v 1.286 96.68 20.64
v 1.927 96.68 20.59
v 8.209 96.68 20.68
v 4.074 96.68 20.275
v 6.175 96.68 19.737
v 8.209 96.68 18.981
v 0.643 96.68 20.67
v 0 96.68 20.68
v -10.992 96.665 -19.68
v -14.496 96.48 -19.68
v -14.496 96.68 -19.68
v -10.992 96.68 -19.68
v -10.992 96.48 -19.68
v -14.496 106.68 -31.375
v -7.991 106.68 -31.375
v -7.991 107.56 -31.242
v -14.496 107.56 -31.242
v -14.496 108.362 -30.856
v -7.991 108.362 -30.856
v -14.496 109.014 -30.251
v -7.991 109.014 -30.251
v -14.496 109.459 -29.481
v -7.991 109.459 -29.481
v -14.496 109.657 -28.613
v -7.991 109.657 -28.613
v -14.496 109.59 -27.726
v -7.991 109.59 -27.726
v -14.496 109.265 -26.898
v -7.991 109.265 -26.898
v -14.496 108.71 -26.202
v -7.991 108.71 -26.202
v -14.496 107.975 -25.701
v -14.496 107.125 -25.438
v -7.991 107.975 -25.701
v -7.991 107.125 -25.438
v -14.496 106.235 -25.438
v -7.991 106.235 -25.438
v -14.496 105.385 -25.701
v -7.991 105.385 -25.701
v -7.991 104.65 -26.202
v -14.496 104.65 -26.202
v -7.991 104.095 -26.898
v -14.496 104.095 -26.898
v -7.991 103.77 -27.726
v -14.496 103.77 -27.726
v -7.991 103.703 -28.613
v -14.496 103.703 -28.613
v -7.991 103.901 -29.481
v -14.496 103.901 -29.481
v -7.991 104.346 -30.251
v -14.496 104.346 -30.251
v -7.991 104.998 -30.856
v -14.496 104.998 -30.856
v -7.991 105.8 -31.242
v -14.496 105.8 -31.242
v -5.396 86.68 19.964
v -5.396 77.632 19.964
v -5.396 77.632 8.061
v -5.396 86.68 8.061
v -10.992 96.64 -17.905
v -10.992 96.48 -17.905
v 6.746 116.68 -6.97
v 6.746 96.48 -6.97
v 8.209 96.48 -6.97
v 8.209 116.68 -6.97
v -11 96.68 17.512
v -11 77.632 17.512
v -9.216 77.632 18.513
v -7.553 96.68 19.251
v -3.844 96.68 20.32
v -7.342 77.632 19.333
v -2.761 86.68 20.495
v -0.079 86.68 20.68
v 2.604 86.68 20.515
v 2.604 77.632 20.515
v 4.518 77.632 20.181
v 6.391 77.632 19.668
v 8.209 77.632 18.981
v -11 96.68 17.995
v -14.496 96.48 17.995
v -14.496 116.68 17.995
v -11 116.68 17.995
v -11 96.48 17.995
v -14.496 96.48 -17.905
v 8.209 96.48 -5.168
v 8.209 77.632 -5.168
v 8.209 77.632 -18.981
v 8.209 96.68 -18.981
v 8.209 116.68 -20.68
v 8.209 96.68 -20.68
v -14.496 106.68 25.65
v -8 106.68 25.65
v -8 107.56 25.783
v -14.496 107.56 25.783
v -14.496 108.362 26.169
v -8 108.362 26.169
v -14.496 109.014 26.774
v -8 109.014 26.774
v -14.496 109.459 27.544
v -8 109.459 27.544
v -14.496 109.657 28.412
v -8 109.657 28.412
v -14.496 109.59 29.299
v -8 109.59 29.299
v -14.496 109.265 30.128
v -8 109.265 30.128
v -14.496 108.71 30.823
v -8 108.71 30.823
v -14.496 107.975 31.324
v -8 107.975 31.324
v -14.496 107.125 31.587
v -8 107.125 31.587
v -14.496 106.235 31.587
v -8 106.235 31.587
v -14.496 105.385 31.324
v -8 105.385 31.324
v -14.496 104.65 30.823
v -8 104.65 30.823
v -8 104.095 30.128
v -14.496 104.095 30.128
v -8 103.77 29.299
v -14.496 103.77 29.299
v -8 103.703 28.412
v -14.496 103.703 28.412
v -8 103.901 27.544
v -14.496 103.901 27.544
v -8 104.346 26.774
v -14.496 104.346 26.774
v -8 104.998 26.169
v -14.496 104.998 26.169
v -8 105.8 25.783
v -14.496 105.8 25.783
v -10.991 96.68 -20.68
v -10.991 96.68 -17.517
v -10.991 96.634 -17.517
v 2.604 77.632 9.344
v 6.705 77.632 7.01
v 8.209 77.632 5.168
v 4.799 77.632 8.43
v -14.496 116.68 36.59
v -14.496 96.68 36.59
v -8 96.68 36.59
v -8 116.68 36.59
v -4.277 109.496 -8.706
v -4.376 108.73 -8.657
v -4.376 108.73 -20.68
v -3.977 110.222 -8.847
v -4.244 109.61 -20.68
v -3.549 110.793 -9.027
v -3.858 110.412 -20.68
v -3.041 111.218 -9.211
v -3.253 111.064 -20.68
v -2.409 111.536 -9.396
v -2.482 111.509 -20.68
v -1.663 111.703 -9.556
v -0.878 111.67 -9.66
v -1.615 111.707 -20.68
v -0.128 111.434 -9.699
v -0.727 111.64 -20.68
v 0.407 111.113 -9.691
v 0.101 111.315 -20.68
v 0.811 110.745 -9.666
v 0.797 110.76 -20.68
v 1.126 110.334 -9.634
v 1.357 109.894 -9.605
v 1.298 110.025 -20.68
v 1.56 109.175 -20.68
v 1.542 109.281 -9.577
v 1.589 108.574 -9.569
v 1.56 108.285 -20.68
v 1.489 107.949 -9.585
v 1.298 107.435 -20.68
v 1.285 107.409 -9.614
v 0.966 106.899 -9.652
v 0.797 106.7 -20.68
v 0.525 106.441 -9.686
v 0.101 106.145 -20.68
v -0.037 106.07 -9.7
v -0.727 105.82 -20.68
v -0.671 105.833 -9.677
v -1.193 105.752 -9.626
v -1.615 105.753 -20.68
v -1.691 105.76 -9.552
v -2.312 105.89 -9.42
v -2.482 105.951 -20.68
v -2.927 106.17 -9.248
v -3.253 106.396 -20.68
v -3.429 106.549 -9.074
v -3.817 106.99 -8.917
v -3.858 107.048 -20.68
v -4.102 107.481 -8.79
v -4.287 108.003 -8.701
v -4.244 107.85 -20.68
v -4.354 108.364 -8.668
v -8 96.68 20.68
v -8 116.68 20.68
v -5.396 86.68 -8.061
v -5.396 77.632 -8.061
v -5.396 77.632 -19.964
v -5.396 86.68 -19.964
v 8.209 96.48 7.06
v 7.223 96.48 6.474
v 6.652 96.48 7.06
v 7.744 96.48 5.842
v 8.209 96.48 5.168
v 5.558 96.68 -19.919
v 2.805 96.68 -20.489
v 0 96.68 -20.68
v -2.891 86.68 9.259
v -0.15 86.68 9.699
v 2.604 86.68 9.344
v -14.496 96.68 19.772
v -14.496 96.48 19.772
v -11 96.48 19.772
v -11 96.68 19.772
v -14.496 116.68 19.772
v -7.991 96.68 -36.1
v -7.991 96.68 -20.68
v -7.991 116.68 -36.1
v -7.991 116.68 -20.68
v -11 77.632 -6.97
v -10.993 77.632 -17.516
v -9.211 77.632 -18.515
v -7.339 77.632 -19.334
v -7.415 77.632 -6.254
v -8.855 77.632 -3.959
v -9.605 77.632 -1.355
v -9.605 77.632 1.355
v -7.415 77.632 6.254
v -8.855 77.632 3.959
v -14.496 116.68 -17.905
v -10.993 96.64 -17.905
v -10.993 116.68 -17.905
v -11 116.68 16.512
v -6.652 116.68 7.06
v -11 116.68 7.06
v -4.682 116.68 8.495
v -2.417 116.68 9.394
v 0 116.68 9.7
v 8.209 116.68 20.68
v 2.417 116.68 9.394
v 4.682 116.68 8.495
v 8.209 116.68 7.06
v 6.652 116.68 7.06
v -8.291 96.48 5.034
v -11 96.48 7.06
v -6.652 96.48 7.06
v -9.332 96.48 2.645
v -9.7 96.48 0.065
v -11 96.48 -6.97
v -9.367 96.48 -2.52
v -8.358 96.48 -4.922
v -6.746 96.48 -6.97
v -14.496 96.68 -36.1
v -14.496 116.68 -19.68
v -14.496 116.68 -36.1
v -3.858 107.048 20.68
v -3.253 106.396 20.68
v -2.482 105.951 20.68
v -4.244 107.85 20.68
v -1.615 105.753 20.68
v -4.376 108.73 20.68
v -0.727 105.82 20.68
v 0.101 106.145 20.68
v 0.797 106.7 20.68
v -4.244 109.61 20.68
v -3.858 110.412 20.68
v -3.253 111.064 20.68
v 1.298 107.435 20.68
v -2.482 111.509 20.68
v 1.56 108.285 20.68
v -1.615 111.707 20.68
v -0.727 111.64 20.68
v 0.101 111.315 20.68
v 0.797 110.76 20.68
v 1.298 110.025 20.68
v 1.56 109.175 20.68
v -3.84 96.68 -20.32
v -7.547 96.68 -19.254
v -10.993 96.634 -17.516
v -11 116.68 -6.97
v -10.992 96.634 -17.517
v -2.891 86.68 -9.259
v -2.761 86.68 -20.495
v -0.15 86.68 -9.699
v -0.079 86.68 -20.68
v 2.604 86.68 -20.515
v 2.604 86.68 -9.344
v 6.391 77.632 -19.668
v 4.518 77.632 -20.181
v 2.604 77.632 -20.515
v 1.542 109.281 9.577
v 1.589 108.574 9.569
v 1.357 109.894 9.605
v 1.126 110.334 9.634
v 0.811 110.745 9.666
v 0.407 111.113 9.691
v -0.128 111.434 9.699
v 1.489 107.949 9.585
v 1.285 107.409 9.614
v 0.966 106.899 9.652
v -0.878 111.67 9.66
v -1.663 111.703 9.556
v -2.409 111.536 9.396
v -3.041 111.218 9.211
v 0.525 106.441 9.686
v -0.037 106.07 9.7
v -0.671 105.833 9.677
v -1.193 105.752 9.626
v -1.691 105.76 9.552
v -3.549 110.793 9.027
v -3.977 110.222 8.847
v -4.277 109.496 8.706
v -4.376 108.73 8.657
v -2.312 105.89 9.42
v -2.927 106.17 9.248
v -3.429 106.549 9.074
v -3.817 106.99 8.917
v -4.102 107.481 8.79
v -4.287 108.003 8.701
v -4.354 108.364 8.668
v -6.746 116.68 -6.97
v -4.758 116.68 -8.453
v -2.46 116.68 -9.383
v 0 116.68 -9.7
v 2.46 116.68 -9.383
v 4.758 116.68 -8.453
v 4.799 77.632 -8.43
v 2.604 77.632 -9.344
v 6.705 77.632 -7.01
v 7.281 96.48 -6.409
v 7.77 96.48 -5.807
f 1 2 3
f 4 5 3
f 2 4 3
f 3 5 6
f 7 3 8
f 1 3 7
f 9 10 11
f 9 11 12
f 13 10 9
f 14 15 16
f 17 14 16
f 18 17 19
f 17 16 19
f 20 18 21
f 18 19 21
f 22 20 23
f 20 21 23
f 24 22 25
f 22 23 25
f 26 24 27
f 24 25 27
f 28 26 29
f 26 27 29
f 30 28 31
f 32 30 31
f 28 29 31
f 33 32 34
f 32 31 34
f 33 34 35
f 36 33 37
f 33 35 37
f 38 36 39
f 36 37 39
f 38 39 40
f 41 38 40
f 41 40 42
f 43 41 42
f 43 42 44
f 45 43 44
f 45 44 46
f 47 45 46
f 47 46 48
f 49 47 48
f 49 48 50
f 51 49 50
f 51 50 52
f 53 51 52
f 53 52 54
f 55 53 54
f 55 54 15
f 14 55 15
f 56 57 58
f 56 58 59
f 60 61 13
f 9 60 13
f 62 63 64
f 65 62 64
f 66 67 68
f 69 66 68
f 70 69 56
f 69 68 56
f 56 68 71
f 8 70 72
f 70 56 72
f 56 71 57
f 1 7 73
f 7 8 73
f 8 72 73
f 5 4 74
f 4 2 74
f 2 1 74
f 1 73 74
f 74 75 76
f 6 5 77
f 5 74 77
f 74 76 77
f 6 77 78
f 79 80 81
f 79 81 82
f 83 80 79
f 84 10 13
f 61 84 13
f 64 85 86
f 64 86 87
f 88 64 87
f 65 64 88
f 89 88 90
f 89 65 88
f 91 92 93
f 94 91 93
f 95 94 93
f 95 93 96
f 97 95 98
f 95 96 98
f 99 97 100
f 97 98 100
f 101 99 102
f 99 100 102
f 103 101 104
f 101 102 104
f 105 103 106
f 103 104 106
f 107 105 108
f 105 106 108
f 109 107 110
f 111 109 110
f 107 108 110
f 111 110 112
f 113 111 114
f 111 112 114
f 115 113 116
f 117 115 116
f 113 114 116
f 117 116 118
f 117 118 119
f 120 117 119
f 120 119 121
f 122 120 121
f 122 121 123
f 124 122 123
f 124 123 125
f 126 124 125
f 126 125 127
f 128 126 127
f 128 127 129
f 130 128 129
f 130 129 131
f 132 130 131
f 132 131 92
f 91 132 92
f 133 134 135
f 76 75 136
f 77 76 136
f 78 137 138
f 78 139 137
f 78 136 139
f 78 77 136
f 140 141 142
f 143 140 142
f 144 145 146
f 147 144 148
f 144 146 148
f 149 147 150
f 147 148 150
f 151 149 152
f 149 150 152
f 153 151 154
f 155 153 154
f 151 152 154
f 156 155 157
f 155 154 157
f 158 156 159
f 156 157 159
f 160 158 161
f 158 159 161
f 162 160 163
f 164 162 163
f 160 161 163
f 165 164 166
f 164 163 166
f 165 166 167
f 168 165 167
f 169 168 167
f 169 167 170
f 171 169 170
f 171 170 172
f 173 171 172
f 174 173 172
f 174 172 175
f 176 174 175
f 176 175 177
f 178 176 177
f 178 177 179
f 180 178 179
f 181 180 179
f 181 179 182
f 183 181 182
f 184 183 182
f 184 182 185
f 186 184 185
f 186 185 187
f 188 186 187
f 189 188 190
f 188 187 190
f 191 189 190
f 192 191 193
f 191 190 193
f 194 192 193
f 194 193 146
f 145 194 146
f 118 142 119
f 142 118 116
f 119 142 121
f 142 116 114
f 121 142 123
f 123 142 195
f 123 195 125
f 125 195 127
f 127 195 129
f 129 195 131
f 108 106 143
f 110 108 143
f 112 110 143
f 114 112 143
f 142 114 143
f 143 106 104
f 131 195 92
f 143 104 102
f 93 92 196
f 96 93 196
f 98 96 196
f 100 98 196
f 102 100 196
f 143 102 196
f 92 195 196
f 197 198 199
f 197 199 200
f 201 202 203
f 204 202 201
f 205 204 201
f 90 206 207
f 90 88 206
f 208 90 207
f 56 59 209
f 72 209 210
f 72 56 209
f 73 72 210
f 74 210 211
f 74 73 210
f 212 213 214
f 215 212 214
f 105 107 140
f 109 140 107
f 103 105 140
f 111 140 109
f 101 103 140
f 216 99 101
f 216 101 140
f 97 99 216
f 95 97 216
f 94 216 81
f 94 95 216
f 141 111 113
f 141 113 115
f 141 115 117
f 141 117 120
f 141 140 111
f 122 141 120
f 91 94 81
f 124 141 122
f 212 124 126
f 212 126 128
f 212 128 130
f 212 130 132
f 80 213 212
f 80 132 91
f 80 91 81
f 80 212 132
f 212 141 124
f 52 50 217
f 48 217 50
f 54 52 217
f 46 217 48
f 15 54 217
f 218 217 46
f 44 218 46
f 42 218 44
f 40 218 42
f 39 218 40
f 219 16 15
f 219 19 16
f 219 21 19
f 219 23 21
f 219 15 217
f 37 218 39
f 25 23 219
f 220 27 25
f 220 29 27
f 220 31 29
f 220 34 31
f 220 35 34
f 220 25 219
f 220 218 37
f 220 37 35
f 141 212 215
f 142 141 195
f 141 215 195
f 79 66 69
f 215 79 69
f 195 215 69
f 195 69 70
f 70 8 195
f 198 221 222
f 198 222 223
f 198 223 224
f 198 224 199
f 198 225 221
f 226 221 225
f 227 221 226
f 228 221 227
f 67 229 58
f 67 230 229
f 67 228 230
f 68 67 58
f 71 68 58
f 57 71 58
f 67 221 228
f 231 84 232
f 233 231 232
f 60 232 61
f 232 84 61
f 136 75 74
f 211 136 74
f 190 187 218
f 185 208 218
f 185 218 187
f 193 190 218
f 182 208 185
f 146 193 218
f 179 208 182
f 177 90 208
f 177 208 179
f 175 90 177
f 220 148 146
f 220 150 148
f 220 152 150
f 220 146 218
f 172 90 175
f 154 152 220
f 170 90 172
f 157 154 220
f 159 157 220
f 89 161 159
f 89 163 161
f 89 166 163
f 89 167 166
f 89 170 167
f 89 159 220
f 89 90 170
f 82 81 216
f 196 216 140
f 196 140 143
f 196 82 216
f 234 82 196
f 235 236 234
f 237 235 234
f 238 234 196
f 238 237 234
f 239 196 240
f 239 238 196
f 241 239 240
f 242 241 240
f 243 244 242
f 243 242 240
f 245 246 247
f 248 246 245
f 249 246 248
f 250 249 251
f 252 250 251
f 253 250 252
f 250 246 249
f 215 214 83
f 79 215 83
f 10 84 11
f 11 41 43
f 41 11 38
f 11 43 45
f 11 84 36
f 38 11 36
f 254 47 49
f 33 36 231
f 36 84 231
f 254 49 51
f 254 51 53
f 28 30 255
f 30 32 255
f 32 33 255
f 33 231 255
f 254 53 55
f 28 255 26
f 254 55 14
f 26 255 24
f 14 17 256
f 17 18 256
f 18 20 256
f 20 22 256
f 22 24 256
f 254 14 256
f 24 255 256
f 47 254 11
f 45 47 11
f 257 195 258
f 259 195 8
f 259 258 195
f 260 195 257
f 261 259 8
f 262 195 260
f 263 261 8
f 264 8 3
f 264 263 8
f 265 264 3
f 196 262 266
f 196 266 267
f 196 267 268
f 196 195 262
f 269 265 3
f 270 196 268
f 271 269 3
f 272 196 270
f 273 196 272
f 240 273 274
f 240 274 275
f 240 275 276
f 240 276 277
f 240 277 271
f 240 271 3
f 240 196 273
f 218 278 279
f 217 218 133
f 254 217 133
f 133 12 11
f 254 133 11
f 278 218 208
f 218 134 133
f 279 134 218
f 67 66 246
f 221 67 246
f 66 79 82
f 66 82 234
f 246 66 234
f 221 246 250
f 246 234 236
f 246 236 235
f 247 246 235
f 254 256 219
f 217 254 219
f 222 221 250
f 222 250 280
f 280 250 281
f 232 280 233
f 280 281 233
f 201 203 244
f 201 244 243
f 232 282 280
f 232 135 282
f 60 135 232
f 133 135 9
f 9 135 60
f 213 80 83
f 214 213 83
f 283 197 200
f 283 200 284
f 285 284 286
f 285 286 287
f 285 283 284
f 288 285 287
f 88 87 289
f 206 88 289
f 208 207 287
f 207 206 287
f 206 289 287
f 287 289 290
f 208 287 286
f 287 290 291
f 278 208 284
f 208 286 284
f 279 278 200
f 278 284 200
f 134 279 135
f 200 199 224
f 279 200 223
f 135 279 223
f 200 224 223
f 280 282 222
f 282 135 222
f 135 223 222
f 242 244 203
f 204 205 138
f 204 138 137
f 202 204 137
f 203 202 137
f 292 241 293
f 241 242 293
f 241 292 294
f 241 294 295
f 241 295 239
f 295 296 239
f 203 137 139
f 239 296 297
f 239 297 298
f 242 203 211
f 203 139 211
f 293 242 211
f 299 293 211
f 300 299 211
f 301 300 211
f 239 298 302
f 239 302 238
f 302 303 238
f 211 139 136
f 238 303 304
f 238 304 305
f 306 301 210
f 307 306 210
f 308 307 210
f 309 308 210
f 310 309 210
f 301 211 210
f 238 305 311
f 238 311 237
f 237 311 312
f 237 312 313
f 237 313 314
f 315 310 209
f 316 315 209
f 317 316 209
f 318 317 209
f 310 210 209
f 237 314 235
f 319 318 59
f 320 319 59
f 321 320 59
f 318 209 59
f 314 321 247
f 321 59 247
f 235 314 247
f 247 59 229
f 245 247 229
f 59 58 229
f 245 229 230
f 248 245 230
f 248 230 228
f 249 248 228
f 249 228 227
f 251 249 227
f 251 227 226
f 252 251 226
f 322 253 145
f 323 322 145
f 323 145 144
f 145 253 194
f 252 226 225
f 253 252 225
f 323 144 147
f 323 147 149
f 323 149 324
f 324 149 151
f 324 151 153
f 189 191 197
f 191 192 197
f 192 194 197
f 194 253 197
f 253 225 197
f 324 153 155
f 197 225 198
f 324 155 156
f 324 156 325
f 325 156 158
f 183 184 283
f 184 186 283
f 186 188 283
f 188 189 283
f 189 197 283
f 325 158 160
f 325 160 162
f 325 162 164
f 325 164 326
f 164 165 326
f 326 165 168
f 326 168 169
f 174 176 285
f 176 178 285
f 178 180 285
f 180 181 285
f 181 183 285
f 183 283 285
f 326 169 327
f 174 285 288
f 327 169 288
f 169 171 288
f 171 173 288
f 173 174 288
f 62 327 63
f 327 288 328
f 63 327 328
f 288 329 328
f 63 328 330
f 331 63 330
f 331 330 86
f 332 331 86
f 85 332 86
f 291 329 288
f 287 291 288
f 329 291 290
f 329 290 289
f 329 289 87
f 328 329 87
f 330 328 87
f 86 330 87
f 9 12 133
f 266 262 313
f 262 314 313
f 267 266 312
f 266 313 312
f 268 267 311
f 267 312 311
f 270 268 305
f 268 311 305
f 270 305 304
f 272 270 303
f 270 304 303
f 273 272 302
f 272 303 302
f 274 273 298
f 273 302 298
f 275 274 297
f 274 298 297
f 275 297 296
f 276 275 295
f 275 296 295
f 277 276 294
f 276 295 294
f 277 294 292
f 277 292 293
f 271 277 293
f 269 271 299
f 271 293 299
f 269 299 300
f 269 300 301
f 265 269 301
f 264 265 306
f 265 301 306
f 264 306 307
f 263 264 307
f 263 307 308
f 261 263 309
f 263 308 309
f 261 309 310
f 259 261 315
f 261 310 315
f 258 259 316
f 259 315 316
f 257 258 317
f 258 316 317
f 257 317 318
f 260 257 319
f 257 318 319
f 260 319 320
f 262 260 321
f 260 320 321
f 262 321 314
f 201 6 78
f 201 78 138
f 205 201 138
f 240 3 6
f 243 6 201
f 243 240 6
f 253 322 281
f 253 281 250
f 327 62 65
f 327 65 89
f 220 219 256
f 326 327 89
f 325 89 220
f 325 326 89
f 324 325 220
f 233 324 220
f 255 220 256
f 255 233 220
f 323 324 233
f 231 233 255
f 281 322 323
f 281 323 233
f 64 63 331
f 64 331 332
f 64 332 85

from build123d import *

# Parameters (mm, degrees)
SKETCH_1_R           = 20.68
SKETCH_1_R_2         = 9.68
EXTRUDE_1_DEPTH      = 116.68
SKETCH_11_W          = 27
SKETCH_11_H          = 150
CUT_EXTRUDE_3_DEPTH  = 40
SKETCH_13_W          = 10
SKETCH_13_H          = 128.345013401
CUT_EXTRUDE_7_DEPTH  = 126.614916312
SKETCH_15_W          = 8
SKETCH_15_H          = 68.68
CUT_EXTRUDE_9_DEPTH  = 48
SKETCH_16_W          = 15.549431524
SKETCH_16_H          = 20
SKETCH_16_W_2        = 15.459431524
EXTRUDE_4_DEPTH      = 19.2
SKETCH_17_W          = 19.20851187
SKETCH_17_H          = 14.03
CUT_EXTRUDE_10_DEPTH = 20.2
SKETCH_18_R          = 9.59
CUT_EXTRUDE_11_DEPTH = 121.289430957
SKETCH_21_R          = 2.985
CUT_EXTRUDE_12_DEPTH = 55.2
EXTRUDE_START        = 55.2
SKETCH_24_R          = 20.59
SKETCH_24_R_2        = 9.59
EXTRUDE_2_DEPTH      = 55.2
CUT_EXTRUDE_13_DEPTH = 55.2
SKETCH_26_W          = 10.00851187
SKETCH_26_H          = 41.68
CUT_EXTRUDE_15_DEPTH = 55.2
SKETCH_27_W          = 10
SKETCH_27_H          = 40
CUT_EXTRUDE_16_DEPTH = 55.2
SKETCH_28_W          = 44.880694938
SKETCH_28_H          = 9.608044066
CUT_EXTRUDE_17_DEPTH = 12.2
SKETCH_35_W          = 13.53
SKETCH_35_H          = 20
EXTRUDE_10_DEPTH     = 15
EXTRUDE_11_DEPTH     = 15
SKETCH_37_W          = 9
SKETCH_37_H          = 20
EXTRUDE_12_DEPTH     = 20
SKETCH_38_W          = 9
SKETCH_38_H          = 20
EXTRUDE_13_DEPTH     = 20
SKETCH_42_R          = 2.985
CUT_EXTRUDE_21_DEPTH = 20
CUT_EXTRUDE_23_DEPTH = 138.235841092
SKETCH_45_W          = 3
SKETCH_45_H          = 20
EXTRUDE_14_DEPTH     = 30
SKETCH_46_W          = 3
SKETCH_46_H          = 20
EXTRUDE_15_DEPTH     = 30
SKETCH_47_W          = 33.078221107
SKETCH_47_H          = 20
EXTRUDE_16_DEPTH     = 50
SKETCH_48_W          = 30
SKETCH_48_H          = 20
EXTRUDE_17_DEPTH     = 50
SKETCH_50_W          = 50
SKETCH_50_H          = 20
EXTRUDE_18_DEPTH     = 1
SKETCH_51_W          = 50
SKETCH_51_H          = 20
EXTRUDE_19_DEPTH     = 1
SKETCH_52_W          = 53
SKETCH_52_H          = 14
CUT_EXTRUDE_24_DEPTH = 151.972575738
SKETCH_53_W          = 53
SKETCH_53_H          = 14
CUT_EXTRUDE_25_DEPTH = 151.942387436
SKETCH_54_W          = 40
SKETCH_54_H          = 73.27
CUT_EXTRUDE_26_DEPTH = 147.866192927
SKETCH_56_W          = 13.00851187
SKETCH_56_H          = 20
EXTRUDE_21_DEPTH     = 3.08
SKETCH_58_W          = 44.672014854
SKETCH_58_H          = 95.939897673
CUT_EXTRUDE_28_DEPTH = 149.701311438
SKETCH_59_R          = 9.7
CUT_EXTRUDE_29_DEPTH = 60.553551814
SKETCH_60_W          = 6.504255935
SKETCH_60_H          = 76.35
CUT_EXTRUDE_30_DEPTH = 60.553551814
CUT_EXTRUDE_32_DEPTH = 20
SKETCH_64_W          = 16.20851187
SKETCH_64_H          = 0.09
EXTRUDE_22_DEPTH     = 20
SKETCH_65_W          = 3.495744065
SKETCH_65_H          = 3.26
CUT_EXTRUDE_33_DEPTH = 58.582567932
SKETCH_66_W          = 3.495744065
SKETCH_66_H          = 1.776778893
SKETCH_66_W_2        = 3.503635083
SKETCH_66_H_2        = 1.775
EXTRUDE_23_DEPTH     = 20.2
SKETCH_68_W          = 6.504255935
SKETCH_68_H          = 3.66
CUT_EXTRUDE_34_DEPTH = 20
SKETCH_69_R          = 2.985
CUT_EXTRUDE_35_DEPTH = 124.351086443
SKETCH_70_R          = 2.985
CUT_EXTRUDE_36_DEPTH = 131.530092773


with BuildPart() as part:
    # 草圖1 → 伸長-薄件1 (new body)
    with BuildSketch(Plane(origin=(0, 0, 0), x_dir=(1, 0, 0), z_dir=(0, 1, 0))):
        Circle(SKETCH_1_R)
        Circle(SKETCH_1_R_2, mode=Mode.SUBTRACT)
    extrude(amount=EXTRUDE_1_DEPTH)

    # 草圖11 → 除料-伸長3 (cut)
    with BuildSketch(Plane(origin=(0, 116.68, 0), x_dir=(1, 0, 0), z_dir=(0, 1, 0))):
        with Locations((21.70851187, -44.235815192)):
            Rectangle(SKETCH_11_W, SKETCH_11_H)
    extrude(amount=-CUT_EXTRUDE_3_DEPTH, mode=Mode.SUBTRACT)

    # 草圖13 → 除料-伸長7 (cut, through all)
    with BuildSketch(Plane.XY.offset(21)):
        with Locations((-16, 58.612182466)):
            Rectangle(SKETCH_13_W, SKETCH_13_H)
    extrude(amount=-CUT_EXTRUDE_7_DEPTH, mode=Mode.SUBTRACT)

    # 草圖15 → 除料-伸長9 (cut)
    with BuildSketch(Plane.XY.offset(21)):
        with Locations((-1.395744065, 52.34)):
            Rectangle(SKETCH_15_W, SKETCH_15_H)
    extrude(amount=-CUT_EXTRUDE_9_DEPTH, mode=Mode.SUBTRACT)

    # 草圖16 → 填料-伸長4 (add)
    with BuildSketch(Plane(origin=(8.20851187, 0, 0), x_dir=(0, 0, -1), z_dir=(1, 0, 0))):
        with Locations((12.905284238, 106.68)):
            Rectangle(SKETCH_16_W, SKETCH_16_H)
        with Locations((-12.860284238, 106.68)):
            Rectangle(SKETCH_16_W_2, SKETCH_16_H)
    extrude(amount=-EXTRUDE_4_DEPTH)

    # 草圖17 → 除料-伸長10 (cut)
    with BuildSketch(Plane(origin=(0, 116.68, 0), x_dir=(1, 0, 0), z_dir=(0, 1, 0))):
        with Locations((-1.395744065, -0.045)):
            Rectangle(SKETCH_17_W, SKETCH_17_H)
    extrude(amount=-CUT_EXTRUDE_10_DEPTH, mode=Mode.SUBTRACT)

    # 草圖18 → 除料-伸長11 (cut, through all)
    with BuildSketch(Plane.XZ):
        with Locations(Location((0, 0, 0), (0, 0, 90))):
            Circle(SKETCH_18_R)
    extrude(amount=-CUT_EXTRUDE_11_DEPTH, mode=Mode.SUBTRACT)

    # 草圖21 → 除料-伸長12 (cut)
    with BuildSketch(Plane(origin=(0, 0, -20.68), x_dir=(-1, 0, 0), z_dir=(0, 0, -1))):
        with Locations((1.39148813, 108.73)):
            Circle(SKETCH_21_R)
    extrude(amount=-CUT_EXTRUDE_12_DEPTH, mode=Mode.SUBTRACT)

    # 草圖24 → 伸長-薄件2 (add)
    with BuildSketch(Plane.XZ.offset(EXTRUDE_START)):
        Circle(SKETCH_24_R)
        Circle(SKETCH_24_R_2, mode=Mode.SUBTRACT)
    extrude(amount=-EXTRUDE_2_DEPTH)

    # 草圖25 → 除料-伸長13 (cut)
    with BuildSketch(Plane.XY.offset(21)):
        Polygon((-1.39148813, -11.785), (22.612379708, -11.785), (22.612379708, -63.873337429), (-22.749525245, -63.873337429), (-22.749525245, -11.785), align=None)
    extrude(amount=-CUT_EXTRUDE_13_DEPTH, mode=Mode.SUBTRACT)

    # 草圖26 → 除料-伸長15 (cut)
    with BuildSketch(Plane(origin=(0, 0, 0), x_dir=(1, 0, 0), z_dir=(0, 1, 0))):
        with Locations((-15.995744065, -0.16)):
            Rectangle(SKETCH_26_W, SKETCH_26_H)
    extrude(amount=-CUT_EXTRUDE_15_DEPTH, mode=Mode.SUBTRACT)

    # 草圖27 → 除料-伸長16 (cut)
    with BuildSketch(Plane(origin=(21, 0, 0), x_dir=(0, 0, -1), z_dir=(1, 0, 0))):
        with Locations((0, 41.68)):
            Rectangle(SKETCH_27_W, SKETCH_27_H)
    extrude(amount=-CUT_EXTRUDE_16_DEPTH, mode=Mode.SUBTRACT)

    # 草圖28 → 除料-伸長17 (cut)
    with BuildSketch(Plane(origin=(21, 0, 0), x_dir=(0, 0, -1), z_dir=(1, 0, 0))):
        Rectangle(SKETCH_28_W, SKETCH_28_H)
    extrude(amount=-CUT_EXTRUDE_17_DEPTH, mode=Mode.SUBTRACT)

    # 草圖35 → 填料-伸長10 (add)
    with BuildSketch(Plane.ZY.offset(10.99148813)):
        with Locations((13.825, 106.68)):
            Rectangle(SKETCH_35_W, SKETCH_35_H)
    extrude(amount=EXTRUDE_10_DEPTH)

    # 草圖36 → 填料-伸長11 (add)
    with BuildSketch(Plane.ZY.offset(10.99148813)):
        Polygon((-20.68, 116.68), (-6.97, 116.68), (-6.97, 96.48), (-20.68, 96.68), align=None)
    extrude(amount=EXTRUDE_11_DEPTH)

    # 草圖37 → 填料-伸長12 (add)
    with BuildSketch(Plane.XY.offset(20.59)):
        with Locations((-21.49148813, 106.68)):
            Rectangle(SKETCH_37_W, SKETCH_37_H)
    extrude(amount=EXTRUDE_12_DEPTH)

    # 草圖38 → 填料-伸長13 (add)
    with BuildSketch(Plane(origin=(0, 0, -20.68), x_dir=(-1, 0, 0), z_dir=(0, 0, -1))):
        with Locations((21.49148813, 106.68)):
            Rectangle(SKETCH_38_W, SKETCH_38_H)
    extrude(amount=EXTRUDE_13_DEPTH)

    # 草圖42 → 除料-伸長21 (cut)
    with BuildSketch(Plane(origin=(-16.99148813, 0, 0), x_dir=(0, 0, -1), z_dir=(1, 0, 0))):
        with Locations((30.68, 106.554418142)):
            Circle(SKETCH_42_R)
        with Locations((-30.395640125, 106.68)):
            Circle(SKETCH_42_R)
    extrude(amount=-CUT_EXTRUDE_21_DEPTH, mode=Mode.SUBTRACT)

    # 草圖43 → 除料-伸長23 (cut, through all)
    with BuildSketch(Plane(origin=(0, 116.68, 0), x_dir=(1, 0, 0), z_dir=(0, 1, 0))):
        Polygon((-11, 6.97), (-10.99148813, 20.68), (-10.99148813, 48.096794253), (-28.274756234, 48.096794253), (-28.274756234, -43.270506289), (-11, -43.270506289), align=None)
    extrude(amount=-CUT_EXTRUDE_23_DEPTH, mode=Mode.SUBTRACT)

    # 草圖45 → 填料-伸長14 (add)
    with BuildSketch(Plane.XY.offset(20.59)):
        with Locations((-9.5, 106.68)):
            Rectangle(SKETCH_45_W, SKETCH_45_H)
    extrude(amount=EXTRUDE_14_DEPTH)

    # 草圖46 → 填料-伸長15 (add)
    with BuildSketch(Plane(origin=(0, 0, -20.68), x_dir=(-1, 0, 0), z_dir=(0, 0, -1))):
        with Locations((9.49148813, 106.68)):
            Rectangle(SKETCH_46_W, SKETCH_46_H)
    extrude(amount=EXTRUDE_15_DEPTH)

    # 草圖47 → 填料-伸長16 (add)
    with BuildSketch(Plane.ZY.offset(11)):
        with Locations((34.050889447, 106.68)):
            Rectangle(SKETCH_47_W, SKETCH_47_H)
    extrude(amount=EXTRUDE_16_DEPTH)

    # 草圖48 → 填料-伸長17 (add)
    with BuildSketch(Plane.ZY.offset(10.99148813)):
        with Locations((-35.68, 106.68)):
            Rectangle(SKETCH_48_W, SKETCH_48_H)
    extrude(amount=EXTRUDE_17_DEPTH)

    # 草圖50 → 填料-伸長18 (add)
    with BuildSketch(Plane(origin=(0, 0, 17.511778893), x_dir=(-1, 0, 0), z_dir=(0, 0, -1))):
        with Locations((36, 106.68)):
            Rectangle(SKETCH_50_W, SKETCH_50_H)
    extrude(amount=EXTRUDE_18_DEPTH)

    # 草圖51 → 填料-伸長19 (add)
    with BuildSketch(Plane.XY.offset(-20.68)):
        with Locations((-35.99148813, 106.68)):
            Rectangle(SKETCH_51_W, SKETCH_51_H)
    extrude(amount=EXTRUDE_19_DEPTH)

    # 草圖52 → 除料-伸長24 (cut, through all)
    with BuildSketch(Plane(origin=(0, 116.68, 0), x_dir=(1, 0, 0), z_dir=(0, 1, 0))):
        with Locations((-34.49148813, 43.68)):
            Rectangle(SKETCH_52_W, SKETCH_52_H)
    extrude(amount=-CUT_EXTRUDE_24_DEPTH, mode=Mode.SUBTRACT)

    # 草圖53 → 除料-伸長25 (cut, through all)
    with BuildSketch(Plane(origin=(0, 116.68, 0), x_dir=(1, 0, 0), z_dir=(0, 1, 0))):
        with Locations((-34.5, -43.59)):
            Rectangle(SKETCH_53_W, SKETCH_53_H)
    extrude(amount=-CUT_EXTRUDE_25_DEPTH, mode=Mode.SUBTRACT)

    # 草圖54 → 除料-伸長26 (cut, through all)
    with BuildSketch(Plane(origin=(0, 116.68, 0), x_dir=(1, 0, 0), z_dir=(0, 1, 0))):
        with Locations((-41, 0.045)):
            Rectangle(SKETCH_54_W, SKETCH_54_H)
    extrude(amount=-CUT_EXTRUDE_26_DEPTH, mode=Mode.SUBTRACT)

    # 草圖56 → 填料-伸長21 (add)
    with BuildSketch(Plane(origin=(0, 0, -36.68), x_dir=(-1, 0, 0), z_dir=(0, 0, -1))):
        with Locations((14.495744065, 106.68)):
            Rectangle(SKETCH_56_W, SKETCH_56_H)
    extrude(amount=EXTRUDE_21_DEPTH)

    # 草圖58 → 除料-伸長28 (cut, through all)
    with BuildSketch(Plane.XY.offset(50)):
        with Locations((-0.234953045, 29.661774302)):
            Rectangle(SKETCH_58_W, SKETCH_58_H)
    extrude(amount=-CUT_EXTRUDE_28_DEPTH, mode=Mode.SUBTRACT)

    # 草圖59 → 除料-伸長29 (cut, through all)
    with BuildSketch(Plane.XZ.offset(-77.631723139)):
        Circle(SKETCH_59_R)
    extrude(amount=-CUT_EXTRUDE_29_DEPTH, mode=Mode.SUBTRACT)

    # 草圖60 → 除料-伸長30 (cut, through all)
    with BuildSketch(Plane(origin=(0, 116.68, 0), x_dir=(1, 0, 0), z_dir=(0, 1, 0))):
        with Locations((-17.747872032, 1.585)):
            Rectangle(SKETCH_60_W, SKETCH_60_H)
    extrude(amount=-CUT_EXTRUDE_30_DEPTH, mode=Mode.SUBTRACT)

    # 草圖61 → 除料-伸長32 (cut)
    with BuildSketch(Plane(origin=(0, 116.68, 0), x_dir=(1, 0, 0), z_dir=(0, 1, 0))):
        Polygon((1.92725193, -20.59), (1.92725193, -22.399121663), (-2.174190472, -21.421542421), (-2.174190472, -20.59), align=None)
    extrude(amount=-CUT_EXTRUDE_32_DEPTH, mode=Mode.SUBTRACT)

    # 草圖64 → 填料-伸長22 (add)
    with BuildSketch(Plane(origin=(0, 116.68, 0), x_dir=(1, 0, 0), z_dir=(0, 1, 0))):
        with Locations((0.104255935, -20.635)):
            Rectangle(SKETCH_64_W, SKETCH_64_H)
    extrude(amount=-EXTRUDE_22_DEPTH)

    # 草圖65 → 除料-伸長33 (cut, through all)
    with BuildSketch(Plane(origin=(0, 116.68, 0), x_dir=(1, 0, 0), z_dir=(0, 1, 0))):
        with Locations((-12.747872033, -18.141778893)):
            Rectangle(SKETCH_65_W, SKETCH_65_H)
    extrude(amount=-CUT_EXTRUDE_33_DEPTH, mode=Mode.SUBTRACT)

    # 草圖66 → 填料-伸長23 (add)
    with BuildSketch(Plane(origin=(0, 96.48, 0), x_dir=(1, 0, 0), z_dir=(0, 1, 0))):
        with Locations((-12.747872033, -18.883389447)):
            Rectangle(SKETCH_66_W, SKETCH_66_H)
        with Locations((-12.743926524, 18.7925)):
            Rectangle(SKETCH_66_W_2, SKETCH_66_H_2)
    extrude(amount=EXTRUDE_23_DEPTH)

    # 草圖68 → 除料-伸長34 (cut)
    with BuildSketch(Plane(origin=(0, 116.68, 0), x_dir=(1, 0, 0), z_dir=(0, 1, 0))):
        with Locations((-11.243616098, 37.93)):
            Rectangle(SKETCH_68_W, SKETCH_68_H)
    extrude(amount=-CUT_EXTRUDE_34_DEPTH, mode=Mode.SUBTRACT)

    # 草圖69 → 除料-伸長35 (cut, through all)
    with BuildSketch(Plane(origin=(-7.99148813, 0, 0), x_dir=(0, 0, -1), z_dir=(1, 0, 0))):
        with Locations((28.39, 106.68)):
            Circle(SKETCH_69_R)
        with Locations((-28.635, 106.68)):
            Circle(SKETCH_69_R)
    extrude(amount=-CUT_EXTRUDE_35_DEPTH, mode=Mode.SUBTRACT)

    # 草圖70 → 除料-伸長36 (cut, through all)
    with BuildSketch(Plane(origin=(0, 0, 20.59), x_dir=(-1, 0, 0), z_dir=(0, 0, -1))):
        with Locations((1.39148813, 108.73)):
            Circle(SKETCH_70_R)
    extrude(amount=-CUT_EXTRUDE_36_DEPTH, mode=Mode.SUBTRACT)


solid = part.part
